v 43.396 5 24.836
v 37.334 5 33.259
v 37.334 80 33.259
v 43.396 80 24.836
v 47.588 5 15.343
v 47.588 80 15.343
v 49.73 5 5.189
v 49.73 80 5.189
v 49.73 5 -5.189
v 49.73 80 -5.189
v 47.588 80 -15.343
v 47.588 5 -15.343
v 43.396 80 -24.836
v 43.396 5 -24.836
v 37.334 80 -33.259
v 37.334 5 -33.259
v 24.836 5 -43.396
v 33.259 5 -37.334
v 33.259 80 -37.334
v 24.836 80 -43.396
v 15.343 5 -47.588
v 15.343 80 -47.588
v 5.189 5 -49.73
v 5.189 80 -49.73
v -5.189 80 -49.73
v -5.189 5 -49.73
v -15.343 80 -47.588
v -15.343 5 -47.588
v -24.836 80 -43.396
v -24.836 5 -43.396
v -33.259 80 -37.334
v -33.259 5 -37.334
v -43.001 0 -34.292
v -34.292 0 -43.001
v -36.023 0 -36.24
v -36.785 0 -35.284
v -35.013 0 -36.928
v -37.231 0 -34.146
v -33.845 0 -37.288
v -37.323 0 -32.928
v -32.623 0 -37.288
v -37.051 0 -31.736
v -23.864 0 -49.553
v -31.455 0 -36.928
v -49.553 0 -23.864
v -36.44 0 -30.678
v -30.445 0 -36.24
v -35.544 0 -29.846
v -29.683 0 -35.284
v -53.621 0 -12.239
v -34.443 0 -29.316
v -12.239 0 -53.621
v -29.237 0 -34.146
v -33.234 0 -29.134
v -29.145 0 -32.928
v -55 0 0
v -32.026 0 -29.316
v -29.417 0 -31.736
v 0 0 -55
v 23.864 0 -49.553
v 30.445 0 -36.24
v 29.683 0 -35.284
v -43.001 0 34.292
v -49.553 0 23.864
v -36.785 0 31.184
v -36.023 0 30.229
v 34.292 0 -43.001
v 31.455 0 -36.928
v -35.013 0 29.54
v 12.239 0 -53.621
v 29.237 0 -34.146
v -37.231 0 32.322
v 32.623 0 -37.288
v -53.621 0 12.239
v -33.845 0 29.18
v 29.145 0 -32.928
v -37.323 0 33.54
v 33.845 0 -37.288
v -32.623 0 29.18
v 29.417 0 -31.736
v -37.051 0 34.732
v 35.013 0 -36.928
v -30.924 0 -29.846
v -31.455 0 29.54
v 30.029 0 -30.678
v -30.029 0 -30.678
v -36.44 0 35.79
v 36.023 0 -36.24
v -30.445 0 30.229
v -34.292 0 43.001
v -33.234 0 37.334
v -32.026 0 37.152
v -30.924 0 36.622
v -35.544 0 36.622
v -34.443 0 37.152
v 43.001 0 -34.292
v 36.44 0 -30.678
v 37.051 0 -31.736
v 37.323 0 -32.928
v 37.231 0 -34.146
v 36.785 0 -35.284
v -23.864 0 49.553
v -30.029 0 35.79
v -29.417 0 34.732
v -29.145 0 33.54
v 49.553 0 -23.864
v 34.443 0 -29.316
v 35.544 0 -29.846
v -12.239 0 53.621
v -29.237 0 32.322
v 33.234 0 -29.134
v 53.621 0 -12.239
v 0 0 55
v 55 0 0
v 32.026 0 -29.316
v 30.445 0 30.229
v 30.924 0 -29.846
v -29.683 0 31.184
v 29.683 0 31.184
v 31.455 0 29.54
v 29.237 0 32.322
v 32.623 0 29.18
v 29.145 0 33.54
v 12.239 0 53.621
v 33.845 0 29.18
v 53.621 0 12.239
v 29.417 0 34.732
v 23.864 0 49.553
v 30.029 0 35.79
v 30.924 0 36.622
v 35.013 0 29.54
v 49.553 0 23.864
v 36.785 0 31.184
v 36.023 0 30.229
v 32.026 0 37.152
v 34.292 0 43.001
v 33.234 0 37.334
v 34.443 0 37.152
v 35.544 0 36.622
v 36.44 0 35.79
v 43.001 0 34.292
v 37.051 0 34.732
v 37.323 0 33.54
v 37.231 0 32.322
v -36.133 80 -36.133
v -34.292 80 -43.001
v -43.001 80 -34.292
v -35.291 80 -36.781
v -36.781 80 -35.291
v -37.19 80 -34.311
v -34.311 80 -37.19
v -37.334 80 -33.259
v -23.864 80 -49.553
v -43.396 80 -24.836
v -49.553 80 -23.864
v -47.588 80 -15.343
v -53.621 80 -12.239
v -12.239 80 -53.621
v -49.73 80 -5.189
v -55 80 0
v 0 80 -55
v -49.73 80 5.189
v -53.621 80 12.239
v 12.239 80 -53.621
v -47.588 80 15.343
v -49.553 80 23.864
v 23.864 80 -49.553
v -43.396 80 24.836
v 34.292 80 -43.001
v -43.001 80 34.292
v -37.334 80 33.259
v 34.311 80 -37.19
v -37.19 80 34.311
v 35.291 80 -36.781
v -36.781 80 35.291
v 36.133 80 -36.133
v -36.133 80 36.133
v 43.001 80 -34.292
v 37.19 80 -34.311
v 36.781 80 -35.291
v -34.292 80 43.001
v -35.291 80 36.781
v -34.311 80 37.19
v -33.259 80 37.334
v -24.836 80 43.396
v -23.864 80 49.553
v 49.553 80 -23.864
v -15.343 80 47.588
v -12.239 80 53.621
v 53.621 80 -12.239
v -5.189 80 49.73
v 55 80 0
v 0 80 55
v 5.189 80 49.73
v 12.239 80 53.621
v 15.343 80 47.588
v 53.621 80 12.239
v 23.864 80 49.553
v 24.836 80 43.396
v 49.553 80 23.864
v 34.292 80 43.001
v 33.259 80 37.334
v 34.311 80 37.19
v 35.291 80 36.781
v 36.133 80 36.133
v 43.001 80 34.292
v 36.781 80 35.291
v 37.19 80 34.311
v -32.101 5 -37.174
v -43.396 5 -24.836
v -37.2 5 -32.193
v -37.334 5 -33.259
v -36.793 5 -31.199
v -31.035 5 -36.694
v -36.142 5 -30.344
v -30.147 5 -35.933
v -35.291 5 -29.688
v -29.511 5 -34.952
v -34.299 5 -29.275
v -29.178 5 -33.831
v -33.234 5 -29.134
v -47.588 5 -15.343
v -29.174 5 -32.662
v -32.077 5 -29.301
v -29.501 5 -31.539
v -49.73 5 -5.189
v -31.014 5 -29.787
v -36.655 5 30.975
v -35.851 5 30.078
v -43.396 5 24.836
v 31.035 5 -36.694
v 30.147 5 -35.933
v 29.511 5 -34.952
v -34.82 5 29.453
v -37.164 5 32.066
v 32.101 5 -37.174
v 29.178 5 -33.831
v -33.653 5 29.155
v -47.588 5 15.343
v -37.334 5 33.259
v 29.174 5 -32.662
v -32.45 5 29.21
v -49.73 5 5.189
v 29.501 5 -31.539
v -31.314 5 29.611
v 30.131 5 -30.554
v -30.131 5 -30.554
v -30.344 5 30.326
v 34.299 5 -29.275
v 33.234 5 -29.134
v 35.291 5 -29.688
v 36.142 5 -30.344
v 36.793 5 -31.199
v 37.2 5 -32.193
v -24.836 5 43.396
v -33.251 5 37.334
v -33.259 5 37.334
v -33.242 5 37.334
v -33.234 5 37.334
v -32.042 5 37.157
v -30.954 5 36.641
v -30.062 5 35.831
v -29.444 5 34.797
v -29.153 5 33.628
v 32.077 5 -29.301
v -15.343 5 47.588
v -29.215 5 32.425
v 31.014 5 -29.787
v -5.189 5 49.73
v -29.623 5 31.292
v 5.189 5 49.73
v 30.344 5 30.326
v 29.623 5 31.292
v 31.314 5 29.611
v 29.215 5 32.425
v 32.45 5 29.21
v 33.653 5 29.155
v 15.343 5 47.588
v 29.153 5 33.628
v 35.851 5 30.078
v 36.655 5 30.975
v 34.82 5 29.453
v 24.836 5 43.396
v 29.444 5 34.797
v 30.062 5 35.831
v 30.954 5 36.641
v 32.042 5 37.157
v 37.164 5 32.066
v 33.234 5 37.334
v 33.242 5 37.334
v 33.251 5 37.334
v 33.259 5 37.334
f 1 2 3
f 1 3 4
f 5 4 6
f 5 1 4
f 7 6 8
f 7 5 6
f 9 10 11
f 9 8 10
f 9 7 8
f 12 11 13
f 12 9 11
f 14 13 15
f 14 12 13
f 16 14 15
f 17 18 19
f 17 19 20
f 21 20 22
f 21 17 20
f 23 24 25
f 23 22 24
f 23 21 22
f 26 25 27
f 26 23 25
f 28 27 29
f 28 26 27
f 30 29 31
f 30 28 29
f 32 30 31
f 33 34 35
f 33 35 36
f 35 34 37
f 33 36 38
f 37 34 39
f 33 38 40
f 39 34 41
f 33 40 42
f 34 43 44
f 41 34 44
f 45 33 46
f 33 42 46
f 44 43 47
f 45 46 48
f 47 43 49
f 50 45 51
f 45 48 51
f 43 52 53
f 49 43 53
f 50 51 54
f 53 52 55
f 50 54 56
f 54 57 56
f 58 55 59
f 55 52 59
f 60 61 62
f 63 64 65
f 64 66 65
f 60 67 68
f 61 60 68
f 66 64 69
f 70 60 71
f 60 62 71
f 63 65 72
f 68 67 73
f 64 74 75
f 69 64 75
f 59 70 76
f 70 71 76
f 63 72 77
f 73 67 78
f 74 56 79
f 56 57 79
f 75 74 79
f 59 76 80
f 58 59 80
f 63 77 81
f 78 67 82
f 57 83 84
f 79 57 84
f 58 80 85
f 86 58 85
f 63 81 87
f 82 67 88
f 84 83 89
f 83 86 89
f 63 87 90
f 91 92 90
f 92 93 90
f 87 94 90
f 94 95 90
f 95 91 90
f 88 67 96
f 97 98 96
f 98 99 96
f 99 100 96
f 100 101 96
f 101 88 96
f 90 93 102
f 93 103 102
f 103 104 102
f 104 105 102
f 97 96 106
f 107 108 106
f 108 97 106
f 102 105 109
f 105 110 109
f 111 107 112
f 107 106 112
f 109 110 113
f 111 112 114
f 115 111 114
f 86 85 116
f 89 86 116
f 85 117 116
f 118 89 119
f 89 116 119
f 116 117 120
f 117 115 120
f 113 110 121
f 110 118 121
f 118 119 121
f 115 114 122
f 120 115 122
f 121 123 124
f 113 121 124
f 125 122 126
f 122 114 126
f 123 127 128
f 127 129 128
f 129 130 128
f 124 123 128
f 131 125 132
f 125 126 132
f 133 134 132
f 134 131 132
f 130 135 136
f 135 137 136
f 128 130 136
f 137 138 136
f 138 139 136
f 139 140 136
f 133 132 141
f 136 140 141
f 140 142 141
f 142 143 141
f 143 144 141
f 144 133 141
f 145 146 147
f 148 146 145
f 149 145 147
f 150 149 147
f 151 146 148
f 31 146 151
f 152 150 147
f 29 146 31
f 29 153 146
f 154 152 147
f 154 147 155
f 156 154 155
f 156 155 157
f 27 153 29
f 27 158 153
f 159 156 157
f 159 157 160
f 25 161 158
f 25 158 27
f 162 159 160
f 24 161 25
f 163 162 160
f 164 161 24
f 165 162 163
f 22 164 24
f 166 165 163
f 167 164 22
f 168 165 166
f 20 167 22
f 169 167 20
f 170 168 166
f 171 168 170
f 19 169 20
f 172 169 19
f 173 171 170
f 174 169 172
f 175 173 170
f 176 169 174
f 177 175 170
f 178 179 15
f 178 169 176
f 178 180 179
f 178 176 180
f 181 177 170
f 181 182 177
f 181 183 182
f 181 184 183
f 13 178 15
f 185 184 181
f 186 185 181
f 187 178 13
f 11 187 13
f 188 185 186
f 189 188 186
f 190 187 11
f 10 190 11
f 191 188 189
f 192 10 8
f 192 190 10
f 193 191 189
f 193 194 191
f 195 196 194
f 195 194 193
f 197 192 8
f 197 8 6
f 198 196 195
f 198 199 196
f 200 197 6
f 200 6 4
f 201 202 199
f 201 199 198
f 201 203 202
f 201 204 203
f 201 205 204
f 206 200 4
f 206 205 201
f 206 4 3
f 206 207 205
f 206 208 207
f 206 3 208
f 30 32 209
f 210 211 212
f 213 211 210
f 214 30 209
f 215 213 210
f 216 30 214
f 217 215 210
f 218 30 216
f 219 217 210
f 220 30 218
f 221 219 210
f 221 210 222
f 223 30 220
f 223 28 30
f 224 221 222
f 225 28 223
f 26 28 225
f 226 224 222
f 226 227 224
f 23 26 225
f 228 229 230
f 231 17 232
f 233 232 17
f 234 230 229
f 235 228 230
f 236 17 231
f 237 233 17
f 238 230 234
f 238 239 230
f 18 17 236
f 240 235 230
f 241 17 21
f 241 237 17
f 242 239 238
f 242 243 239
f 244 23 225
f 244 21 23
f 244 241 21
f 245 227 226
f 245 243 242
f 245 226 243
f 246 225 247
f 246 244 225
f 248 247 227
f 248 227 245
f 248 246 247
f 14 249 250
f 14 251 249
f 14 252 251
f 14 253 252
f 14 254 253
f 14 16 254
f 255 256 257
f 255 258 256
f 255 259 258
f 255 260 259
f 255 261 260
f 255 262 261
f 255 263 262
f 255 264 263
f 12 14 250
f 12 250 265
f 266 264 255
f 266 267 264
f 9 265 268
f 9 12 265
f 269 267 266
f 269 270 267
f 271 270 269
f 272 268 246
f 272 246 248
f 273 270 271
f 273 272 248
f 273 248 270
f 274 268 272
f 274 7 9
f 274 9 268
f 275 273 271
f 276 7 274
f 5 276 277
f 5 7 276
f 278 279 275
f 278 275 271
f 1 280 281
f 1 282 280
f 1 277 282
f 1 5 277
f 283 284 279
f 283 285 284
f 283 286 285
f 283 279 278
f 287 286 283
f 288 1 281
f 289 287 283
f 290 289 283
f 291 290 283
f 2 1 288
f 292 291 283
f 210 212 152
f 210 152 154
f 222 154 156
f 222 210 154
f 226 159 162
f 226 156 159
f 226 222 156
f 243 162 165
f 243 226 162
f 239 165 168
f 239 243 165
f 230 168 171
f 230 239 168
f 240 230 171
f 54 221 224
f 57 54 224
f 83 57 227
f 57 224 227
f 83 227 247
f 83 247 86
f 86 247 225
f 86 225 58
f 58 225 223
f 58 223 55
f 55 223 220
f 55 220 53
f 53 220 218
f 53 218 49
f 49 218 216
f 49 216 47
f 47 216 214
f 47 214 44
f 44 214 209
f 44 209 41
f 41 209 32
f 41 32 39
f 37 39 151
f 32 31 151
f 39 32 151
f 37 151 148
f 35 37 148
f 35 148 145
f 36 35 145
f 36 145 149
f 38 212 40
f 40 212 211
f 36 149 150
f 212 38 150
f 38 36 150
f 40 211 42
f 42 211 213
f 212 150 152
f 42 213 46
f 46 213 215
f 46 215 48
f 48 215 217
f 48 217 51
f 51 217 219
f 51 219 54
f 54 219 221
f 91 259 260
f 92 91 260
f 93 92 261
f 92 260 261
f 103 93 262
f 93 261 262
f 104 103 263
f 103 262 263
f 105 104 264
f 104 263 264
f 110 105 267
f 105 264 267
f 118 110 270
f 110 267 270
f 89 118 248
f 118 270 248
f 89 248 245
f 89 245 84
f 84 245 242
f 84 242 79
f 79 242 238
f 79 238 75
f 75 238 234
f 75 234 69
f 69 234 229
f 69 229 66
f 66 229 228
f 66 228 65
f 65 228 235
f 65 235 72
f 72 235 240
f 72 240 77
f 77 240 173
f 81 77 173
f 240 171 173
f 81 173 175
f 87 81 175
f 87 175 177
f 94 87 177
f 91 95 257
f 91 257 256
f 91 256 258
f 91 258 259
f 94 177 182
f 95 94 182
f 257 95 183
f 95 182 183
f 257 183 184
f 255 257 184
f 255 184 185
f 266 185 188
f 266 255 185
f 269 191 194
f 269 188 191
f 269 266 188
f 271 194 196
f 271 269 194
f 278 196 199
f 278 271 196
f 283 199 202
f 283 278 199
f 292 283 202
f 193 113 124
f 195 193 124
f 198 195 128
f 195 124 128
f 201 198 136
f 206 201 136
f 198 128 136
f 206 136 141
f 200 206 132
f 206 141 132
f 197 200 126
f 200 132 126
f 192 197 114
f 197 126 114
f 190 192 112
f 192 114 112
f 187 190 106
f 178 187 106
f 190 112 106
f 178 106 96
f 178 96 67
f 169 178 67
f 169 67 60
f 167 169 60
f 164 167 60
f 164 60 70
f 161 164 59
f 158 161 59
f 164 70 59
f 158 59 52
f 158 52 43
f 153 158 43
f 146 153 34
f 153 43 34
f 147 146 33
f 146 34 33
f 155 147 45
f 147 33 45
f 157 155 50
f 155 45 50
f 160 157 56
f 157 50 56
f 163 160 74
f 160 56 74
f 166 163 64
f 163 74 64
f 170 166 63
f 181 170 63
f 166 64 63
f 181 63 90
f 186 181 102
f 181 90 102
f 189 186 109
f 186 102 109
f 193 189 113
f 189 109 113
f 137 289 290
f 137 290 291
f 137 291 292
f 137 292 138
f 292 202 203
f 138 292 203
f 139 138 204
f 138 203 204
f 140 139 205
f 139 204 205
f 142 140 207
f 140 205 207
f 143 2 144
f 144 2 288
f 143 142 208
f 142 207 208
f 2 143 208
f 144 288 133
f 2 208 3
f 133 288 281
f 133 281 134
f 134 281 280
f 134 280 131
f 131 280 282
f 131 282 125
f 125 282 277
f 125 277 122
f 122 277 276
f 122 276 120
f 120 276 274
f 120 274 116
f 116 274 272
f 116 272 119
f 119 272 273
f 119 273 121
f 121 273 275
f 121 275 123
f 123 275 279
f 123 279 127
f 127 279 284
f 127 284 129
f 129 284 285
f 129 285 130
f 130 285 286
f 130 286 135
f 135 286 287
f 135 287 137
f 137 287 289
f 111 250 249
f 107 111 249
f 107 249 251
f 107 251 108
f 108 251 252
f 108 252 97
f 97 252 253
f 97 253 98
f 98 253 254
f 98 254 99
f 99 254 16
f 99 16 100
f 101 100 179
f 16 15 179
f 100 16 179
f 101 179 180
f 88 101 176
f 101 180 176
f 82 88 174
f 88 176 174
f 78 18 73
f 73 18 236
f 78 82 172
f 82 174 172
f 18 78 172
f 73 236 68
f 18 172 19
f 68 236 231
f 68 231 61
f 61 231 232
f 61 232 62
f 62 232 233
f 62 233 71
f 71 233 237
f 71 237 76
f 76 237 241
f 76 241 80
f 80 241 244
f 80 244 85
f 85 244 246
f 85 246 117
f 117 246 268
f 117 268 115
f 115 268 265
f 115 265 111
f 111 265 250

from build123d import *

# Parameters (mm, degrees)
SKETCH1_R           = 55
BOSS_EXTRUDE1_DEPTH = 80
SHELL1_T            = -5
SKETCH2_R           = 4.1
CUT_EXTRUDE1_DEPTH  = 112.579568022


with BuildPart() as part:
    # Sketch1 → Boss-Extrude1 (new body)
    with BuildSketch(Plane(origin=(0, 0, 0), x_dir=(1, 0, 0), z_dir=(0, 1, 0))):
        with Locations(Location((0, 0, 0), (0, 0, 270))):
            Circle(SKETCH1_R)
    extrude(amount=BOSS_EXTRUDE1_DEPTH)

    # Shell1
    shell1_openings = [part.faces().sort_by_distance(p)[0] for p in [
        (0, 80, 0),
    ]]
    offset(amount=SHELL1_T, openings=shell1_openings, kind=Kind.INTERSECTION)

    # Sketch2 → Cut-Extrude1 (cut, through all)
    with BuildSketch(Plane(origin=(0, 80, 0), x_dir=(1, 0, 0), z_dir=(0, 1, 0))):
        with Locations(Location((-33.234018716, -33.234018716, 0), (0, 0, 270))):
            Circle(SKETCH2_R)
        with Locations(Location((-33.234018716, 33.234018716, 0), (0, 0, 270))):
            Circle(SKETCH2_R)
        with Locations(Location((33.234018716, 33.234018716, 0), (0, 0, 270))):
            Circle(SKETCH2_R)
        with Locations(Location((33.234018716, -33.234018716, 0), (0, 0, 270))):
            Circle(SKETCH2_R)
    extrude(amount=-CUT_EXTRUDE1_DEPTH, mode=Mode.SUBTRACT)


solid = part.part
